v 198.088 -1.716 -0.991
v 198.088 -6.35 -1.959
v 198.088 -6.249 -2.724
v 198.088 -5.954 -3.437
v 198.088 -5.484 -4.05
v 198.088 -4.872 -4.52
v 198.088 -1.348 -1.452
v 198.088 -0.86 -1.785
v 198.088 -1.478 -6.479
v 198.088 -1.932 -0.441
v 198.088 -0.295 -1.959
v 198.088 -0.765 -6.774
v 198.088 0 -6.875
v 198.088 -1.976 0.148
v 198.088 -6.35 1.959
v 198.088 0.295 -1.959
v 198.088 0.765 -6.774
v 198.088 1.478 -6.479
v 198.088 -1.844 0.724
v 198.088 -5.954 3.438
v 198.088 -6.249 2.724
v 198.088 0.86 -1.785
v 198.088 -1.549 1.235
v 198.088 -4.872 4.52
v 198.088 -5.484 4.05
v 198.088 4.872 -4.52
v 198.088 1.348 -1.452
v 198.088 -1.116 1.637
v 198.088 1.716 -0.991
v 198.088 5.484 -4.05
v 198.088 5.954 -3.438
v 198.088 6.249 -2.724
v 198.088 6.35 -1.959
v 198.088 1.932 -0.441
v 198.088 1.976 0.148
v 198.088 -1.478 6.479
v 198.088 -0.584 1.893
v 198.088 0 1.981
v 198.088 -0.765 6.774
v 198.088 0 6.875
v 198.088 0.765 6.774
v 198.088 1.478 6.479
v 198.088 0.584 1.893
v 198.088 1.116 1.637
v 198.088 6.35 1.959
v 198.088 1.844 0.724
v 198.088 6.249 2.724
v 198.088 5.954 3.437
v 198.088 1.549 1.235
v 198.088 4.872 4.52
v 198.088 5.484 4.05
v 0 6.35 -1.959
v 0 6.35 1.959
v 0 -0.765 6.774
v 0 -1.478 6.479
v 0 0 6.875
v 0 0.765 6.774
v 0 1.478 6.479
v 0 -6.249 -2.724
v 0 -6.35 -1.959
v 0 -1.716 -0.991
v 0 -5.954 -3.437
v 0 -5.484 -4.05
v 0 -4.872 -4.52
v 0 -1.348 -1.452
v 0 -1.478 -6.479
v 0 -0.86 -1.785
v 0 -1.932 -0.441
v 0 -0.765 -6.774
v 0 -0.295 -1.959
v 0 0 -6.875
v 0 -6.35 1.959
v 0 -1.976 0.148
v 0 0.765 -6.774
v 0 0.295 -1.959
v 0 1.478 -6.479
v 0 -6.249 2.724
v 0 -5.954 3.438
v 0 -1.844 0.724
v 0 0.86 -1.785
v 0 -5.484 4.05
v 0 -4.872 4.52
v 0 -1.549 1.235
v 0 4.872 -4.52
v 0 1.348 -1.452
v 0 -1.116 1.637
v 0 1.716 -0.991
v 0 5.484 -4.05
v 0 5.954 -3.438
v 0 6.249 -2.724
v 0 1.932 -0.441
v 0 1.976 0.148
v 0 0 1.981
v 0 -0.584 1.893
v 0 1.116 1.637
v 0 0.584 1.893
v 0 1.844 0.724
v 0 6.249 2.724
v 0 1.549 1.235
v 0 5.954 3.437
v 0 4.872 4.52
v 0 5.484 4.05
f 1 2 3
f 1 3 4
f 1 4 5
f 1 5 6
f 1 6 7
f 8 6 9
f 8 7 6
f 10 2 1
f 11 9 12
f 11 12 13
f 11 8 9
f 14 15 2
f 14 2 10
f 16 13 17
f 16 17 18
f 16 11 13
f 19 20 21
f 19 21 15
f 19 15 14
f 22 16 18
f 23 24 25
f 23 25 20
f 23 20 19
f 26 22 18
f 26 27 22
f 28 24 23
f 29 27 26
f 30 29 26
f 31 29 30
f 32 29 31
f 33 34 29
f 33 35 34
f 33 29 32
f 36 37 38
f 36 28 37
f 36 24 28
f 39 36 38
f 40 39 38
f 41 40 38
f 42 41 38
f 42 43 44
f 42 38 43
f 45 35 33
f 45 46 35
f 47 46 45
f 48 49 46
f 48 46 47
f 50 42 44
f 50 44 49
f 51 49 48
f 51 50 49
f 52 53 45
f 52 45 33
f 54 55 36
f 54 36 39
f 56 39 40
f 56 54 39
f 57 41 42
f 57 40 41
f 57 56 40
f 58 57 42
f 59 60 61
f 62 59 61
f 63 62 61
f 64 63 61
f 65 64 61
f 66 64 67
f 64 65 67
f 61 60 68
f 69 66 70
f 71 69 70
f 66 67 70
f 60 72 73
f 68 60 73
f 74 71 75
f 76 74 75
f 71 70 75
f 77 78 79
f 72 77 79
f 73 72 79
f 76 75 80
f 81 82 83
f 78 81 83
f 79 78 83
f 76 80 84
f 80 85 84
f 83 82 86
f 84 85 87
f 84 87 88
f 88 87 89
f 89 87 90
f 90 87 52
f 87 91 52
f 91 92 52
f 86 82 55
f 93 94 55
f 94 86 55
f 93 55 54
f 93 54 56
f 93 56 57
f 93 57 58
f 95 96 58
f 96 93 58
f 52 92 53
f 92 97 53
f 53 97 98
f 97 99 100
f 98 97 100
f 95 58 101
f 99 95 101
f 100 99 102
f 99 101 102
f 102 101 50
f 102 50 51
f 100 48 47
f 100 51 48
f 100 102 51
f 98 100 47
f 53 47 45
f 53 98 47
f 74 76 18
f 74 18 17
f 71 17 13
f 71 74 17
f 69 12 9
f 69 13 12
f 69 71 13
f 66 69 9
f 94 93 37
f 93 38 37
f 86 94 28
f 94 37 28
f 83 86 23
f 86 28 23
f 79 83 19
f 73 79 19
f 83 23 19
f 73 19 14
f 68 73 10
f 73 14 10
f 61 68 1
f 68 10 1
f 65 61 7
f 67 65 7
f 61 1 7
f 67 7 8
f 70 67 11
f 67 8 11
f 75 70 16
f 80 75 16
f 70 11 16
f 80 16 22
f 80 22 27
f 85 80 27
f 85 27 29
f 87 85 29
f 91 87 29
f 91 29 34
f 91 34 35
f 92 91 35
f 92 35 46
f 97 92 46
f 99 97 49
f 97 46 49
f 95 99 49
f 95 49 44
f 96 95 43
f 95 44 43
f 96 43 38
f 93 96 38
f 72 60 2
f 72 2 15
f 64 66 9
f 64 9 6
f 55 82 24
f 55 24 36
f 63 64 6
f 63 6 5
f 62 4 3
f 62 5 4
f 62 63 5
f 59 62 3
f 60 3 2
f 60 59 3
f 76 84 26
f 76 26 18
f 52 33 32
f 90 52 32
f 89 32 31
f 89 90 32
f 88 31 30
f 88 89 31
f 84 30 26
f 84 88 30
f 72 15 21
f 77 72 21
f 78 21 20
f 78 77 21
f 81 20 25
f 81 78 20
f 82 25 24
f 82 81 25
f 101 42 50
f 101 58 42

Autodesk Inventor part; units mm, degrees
ref_plane "YZ Plane" through (0, 0, 0) normal (1, 0, 0) x (0, 1, 0)
ref_plane "XZ Plane" through (0, 0, 0) normal (0, 1, 0) x (-1, 0, 0)
ref_plane "XY Plane" through (0, 0, 0) normal (0, 0, 1) x (1, 0, 0)
sketch "Sketch1" plane through (0, 0, 0) normal (1, 0, 0) x (0, 1, 0)
  line L0 (-6.35, -1.9593) -> (-6.35, 1.9593)
  line L1 (-4.8718, 4.5196) -> (-1.4782, 6.4789)
  line L2 (1.4782, 6.4789) -> (4.8718, 4.5196)
  line L3 (6.35, 1.9593) -> (6.35, -1.9593)
  line L4 (4.8718, -4.5196) -> (1.4782, -6.4789)
  line L5 (-1.4782, -6.4789) -> (-4.8718, -4.5196)
  arc A0 (4.8718, -4.5196) -> (6.35, -1.9593) centre (3.3937, -1.9593) ccw
  arc A1 (-1.4782, -6.4789) -> (1.4782, -6.4789) centre (0, -3.9187) ccw
  arc A2 (-6.35, -1.9593) -> (-4.8718, -4.5196) centre (-3.3937, -1.9593) ccw
  arc A3 (-4.8718, 4.5196) -> (-6.35, 1.9593) centre (-3.3937, 1.9593) ccw
  arc A4 (1.4782, 6.4789) -> (-1.4782, 6.4789) centre (0, 3.9187) ccw
  arc A5 (6.35, 1.9593) -> (4.8718, 4.5196) centre (3.3937, 1.9593) ccw
  circle A6 centre (0, 0) radius 6.875 construction
  point P0 (-6.35, -3.6662)
  point P1 (-6.35, 3.6662)
  point P2 (0, 7.3323)
  point P3 (6.35, 3.6662)
  point P4 (6.35, -3.6662)
  point P5 (0, -7.3323)
  dimension "d1" = 12.7
  dimension "d2" = 13.75
extrude "Extrusion1" add sketch "Sketch1" along normal blind 198.0875
sketch "Sketch2" plane through (0, 0, 0) normal (-1, 0, 0) x (0, 0, 1)
  point P0 (0, 0)
  point P1 (0, 0)
hole "Hole1" at (0, 0, 0) direction (1, 0, 0) diameter 3.9624 end through all thread size "10-32 UNF" class "2B" standard "ANSI Unified Screw Threads"
properties part number "STOCK,HEX,ROUND,HOOD" material "Aluminum 6061"
